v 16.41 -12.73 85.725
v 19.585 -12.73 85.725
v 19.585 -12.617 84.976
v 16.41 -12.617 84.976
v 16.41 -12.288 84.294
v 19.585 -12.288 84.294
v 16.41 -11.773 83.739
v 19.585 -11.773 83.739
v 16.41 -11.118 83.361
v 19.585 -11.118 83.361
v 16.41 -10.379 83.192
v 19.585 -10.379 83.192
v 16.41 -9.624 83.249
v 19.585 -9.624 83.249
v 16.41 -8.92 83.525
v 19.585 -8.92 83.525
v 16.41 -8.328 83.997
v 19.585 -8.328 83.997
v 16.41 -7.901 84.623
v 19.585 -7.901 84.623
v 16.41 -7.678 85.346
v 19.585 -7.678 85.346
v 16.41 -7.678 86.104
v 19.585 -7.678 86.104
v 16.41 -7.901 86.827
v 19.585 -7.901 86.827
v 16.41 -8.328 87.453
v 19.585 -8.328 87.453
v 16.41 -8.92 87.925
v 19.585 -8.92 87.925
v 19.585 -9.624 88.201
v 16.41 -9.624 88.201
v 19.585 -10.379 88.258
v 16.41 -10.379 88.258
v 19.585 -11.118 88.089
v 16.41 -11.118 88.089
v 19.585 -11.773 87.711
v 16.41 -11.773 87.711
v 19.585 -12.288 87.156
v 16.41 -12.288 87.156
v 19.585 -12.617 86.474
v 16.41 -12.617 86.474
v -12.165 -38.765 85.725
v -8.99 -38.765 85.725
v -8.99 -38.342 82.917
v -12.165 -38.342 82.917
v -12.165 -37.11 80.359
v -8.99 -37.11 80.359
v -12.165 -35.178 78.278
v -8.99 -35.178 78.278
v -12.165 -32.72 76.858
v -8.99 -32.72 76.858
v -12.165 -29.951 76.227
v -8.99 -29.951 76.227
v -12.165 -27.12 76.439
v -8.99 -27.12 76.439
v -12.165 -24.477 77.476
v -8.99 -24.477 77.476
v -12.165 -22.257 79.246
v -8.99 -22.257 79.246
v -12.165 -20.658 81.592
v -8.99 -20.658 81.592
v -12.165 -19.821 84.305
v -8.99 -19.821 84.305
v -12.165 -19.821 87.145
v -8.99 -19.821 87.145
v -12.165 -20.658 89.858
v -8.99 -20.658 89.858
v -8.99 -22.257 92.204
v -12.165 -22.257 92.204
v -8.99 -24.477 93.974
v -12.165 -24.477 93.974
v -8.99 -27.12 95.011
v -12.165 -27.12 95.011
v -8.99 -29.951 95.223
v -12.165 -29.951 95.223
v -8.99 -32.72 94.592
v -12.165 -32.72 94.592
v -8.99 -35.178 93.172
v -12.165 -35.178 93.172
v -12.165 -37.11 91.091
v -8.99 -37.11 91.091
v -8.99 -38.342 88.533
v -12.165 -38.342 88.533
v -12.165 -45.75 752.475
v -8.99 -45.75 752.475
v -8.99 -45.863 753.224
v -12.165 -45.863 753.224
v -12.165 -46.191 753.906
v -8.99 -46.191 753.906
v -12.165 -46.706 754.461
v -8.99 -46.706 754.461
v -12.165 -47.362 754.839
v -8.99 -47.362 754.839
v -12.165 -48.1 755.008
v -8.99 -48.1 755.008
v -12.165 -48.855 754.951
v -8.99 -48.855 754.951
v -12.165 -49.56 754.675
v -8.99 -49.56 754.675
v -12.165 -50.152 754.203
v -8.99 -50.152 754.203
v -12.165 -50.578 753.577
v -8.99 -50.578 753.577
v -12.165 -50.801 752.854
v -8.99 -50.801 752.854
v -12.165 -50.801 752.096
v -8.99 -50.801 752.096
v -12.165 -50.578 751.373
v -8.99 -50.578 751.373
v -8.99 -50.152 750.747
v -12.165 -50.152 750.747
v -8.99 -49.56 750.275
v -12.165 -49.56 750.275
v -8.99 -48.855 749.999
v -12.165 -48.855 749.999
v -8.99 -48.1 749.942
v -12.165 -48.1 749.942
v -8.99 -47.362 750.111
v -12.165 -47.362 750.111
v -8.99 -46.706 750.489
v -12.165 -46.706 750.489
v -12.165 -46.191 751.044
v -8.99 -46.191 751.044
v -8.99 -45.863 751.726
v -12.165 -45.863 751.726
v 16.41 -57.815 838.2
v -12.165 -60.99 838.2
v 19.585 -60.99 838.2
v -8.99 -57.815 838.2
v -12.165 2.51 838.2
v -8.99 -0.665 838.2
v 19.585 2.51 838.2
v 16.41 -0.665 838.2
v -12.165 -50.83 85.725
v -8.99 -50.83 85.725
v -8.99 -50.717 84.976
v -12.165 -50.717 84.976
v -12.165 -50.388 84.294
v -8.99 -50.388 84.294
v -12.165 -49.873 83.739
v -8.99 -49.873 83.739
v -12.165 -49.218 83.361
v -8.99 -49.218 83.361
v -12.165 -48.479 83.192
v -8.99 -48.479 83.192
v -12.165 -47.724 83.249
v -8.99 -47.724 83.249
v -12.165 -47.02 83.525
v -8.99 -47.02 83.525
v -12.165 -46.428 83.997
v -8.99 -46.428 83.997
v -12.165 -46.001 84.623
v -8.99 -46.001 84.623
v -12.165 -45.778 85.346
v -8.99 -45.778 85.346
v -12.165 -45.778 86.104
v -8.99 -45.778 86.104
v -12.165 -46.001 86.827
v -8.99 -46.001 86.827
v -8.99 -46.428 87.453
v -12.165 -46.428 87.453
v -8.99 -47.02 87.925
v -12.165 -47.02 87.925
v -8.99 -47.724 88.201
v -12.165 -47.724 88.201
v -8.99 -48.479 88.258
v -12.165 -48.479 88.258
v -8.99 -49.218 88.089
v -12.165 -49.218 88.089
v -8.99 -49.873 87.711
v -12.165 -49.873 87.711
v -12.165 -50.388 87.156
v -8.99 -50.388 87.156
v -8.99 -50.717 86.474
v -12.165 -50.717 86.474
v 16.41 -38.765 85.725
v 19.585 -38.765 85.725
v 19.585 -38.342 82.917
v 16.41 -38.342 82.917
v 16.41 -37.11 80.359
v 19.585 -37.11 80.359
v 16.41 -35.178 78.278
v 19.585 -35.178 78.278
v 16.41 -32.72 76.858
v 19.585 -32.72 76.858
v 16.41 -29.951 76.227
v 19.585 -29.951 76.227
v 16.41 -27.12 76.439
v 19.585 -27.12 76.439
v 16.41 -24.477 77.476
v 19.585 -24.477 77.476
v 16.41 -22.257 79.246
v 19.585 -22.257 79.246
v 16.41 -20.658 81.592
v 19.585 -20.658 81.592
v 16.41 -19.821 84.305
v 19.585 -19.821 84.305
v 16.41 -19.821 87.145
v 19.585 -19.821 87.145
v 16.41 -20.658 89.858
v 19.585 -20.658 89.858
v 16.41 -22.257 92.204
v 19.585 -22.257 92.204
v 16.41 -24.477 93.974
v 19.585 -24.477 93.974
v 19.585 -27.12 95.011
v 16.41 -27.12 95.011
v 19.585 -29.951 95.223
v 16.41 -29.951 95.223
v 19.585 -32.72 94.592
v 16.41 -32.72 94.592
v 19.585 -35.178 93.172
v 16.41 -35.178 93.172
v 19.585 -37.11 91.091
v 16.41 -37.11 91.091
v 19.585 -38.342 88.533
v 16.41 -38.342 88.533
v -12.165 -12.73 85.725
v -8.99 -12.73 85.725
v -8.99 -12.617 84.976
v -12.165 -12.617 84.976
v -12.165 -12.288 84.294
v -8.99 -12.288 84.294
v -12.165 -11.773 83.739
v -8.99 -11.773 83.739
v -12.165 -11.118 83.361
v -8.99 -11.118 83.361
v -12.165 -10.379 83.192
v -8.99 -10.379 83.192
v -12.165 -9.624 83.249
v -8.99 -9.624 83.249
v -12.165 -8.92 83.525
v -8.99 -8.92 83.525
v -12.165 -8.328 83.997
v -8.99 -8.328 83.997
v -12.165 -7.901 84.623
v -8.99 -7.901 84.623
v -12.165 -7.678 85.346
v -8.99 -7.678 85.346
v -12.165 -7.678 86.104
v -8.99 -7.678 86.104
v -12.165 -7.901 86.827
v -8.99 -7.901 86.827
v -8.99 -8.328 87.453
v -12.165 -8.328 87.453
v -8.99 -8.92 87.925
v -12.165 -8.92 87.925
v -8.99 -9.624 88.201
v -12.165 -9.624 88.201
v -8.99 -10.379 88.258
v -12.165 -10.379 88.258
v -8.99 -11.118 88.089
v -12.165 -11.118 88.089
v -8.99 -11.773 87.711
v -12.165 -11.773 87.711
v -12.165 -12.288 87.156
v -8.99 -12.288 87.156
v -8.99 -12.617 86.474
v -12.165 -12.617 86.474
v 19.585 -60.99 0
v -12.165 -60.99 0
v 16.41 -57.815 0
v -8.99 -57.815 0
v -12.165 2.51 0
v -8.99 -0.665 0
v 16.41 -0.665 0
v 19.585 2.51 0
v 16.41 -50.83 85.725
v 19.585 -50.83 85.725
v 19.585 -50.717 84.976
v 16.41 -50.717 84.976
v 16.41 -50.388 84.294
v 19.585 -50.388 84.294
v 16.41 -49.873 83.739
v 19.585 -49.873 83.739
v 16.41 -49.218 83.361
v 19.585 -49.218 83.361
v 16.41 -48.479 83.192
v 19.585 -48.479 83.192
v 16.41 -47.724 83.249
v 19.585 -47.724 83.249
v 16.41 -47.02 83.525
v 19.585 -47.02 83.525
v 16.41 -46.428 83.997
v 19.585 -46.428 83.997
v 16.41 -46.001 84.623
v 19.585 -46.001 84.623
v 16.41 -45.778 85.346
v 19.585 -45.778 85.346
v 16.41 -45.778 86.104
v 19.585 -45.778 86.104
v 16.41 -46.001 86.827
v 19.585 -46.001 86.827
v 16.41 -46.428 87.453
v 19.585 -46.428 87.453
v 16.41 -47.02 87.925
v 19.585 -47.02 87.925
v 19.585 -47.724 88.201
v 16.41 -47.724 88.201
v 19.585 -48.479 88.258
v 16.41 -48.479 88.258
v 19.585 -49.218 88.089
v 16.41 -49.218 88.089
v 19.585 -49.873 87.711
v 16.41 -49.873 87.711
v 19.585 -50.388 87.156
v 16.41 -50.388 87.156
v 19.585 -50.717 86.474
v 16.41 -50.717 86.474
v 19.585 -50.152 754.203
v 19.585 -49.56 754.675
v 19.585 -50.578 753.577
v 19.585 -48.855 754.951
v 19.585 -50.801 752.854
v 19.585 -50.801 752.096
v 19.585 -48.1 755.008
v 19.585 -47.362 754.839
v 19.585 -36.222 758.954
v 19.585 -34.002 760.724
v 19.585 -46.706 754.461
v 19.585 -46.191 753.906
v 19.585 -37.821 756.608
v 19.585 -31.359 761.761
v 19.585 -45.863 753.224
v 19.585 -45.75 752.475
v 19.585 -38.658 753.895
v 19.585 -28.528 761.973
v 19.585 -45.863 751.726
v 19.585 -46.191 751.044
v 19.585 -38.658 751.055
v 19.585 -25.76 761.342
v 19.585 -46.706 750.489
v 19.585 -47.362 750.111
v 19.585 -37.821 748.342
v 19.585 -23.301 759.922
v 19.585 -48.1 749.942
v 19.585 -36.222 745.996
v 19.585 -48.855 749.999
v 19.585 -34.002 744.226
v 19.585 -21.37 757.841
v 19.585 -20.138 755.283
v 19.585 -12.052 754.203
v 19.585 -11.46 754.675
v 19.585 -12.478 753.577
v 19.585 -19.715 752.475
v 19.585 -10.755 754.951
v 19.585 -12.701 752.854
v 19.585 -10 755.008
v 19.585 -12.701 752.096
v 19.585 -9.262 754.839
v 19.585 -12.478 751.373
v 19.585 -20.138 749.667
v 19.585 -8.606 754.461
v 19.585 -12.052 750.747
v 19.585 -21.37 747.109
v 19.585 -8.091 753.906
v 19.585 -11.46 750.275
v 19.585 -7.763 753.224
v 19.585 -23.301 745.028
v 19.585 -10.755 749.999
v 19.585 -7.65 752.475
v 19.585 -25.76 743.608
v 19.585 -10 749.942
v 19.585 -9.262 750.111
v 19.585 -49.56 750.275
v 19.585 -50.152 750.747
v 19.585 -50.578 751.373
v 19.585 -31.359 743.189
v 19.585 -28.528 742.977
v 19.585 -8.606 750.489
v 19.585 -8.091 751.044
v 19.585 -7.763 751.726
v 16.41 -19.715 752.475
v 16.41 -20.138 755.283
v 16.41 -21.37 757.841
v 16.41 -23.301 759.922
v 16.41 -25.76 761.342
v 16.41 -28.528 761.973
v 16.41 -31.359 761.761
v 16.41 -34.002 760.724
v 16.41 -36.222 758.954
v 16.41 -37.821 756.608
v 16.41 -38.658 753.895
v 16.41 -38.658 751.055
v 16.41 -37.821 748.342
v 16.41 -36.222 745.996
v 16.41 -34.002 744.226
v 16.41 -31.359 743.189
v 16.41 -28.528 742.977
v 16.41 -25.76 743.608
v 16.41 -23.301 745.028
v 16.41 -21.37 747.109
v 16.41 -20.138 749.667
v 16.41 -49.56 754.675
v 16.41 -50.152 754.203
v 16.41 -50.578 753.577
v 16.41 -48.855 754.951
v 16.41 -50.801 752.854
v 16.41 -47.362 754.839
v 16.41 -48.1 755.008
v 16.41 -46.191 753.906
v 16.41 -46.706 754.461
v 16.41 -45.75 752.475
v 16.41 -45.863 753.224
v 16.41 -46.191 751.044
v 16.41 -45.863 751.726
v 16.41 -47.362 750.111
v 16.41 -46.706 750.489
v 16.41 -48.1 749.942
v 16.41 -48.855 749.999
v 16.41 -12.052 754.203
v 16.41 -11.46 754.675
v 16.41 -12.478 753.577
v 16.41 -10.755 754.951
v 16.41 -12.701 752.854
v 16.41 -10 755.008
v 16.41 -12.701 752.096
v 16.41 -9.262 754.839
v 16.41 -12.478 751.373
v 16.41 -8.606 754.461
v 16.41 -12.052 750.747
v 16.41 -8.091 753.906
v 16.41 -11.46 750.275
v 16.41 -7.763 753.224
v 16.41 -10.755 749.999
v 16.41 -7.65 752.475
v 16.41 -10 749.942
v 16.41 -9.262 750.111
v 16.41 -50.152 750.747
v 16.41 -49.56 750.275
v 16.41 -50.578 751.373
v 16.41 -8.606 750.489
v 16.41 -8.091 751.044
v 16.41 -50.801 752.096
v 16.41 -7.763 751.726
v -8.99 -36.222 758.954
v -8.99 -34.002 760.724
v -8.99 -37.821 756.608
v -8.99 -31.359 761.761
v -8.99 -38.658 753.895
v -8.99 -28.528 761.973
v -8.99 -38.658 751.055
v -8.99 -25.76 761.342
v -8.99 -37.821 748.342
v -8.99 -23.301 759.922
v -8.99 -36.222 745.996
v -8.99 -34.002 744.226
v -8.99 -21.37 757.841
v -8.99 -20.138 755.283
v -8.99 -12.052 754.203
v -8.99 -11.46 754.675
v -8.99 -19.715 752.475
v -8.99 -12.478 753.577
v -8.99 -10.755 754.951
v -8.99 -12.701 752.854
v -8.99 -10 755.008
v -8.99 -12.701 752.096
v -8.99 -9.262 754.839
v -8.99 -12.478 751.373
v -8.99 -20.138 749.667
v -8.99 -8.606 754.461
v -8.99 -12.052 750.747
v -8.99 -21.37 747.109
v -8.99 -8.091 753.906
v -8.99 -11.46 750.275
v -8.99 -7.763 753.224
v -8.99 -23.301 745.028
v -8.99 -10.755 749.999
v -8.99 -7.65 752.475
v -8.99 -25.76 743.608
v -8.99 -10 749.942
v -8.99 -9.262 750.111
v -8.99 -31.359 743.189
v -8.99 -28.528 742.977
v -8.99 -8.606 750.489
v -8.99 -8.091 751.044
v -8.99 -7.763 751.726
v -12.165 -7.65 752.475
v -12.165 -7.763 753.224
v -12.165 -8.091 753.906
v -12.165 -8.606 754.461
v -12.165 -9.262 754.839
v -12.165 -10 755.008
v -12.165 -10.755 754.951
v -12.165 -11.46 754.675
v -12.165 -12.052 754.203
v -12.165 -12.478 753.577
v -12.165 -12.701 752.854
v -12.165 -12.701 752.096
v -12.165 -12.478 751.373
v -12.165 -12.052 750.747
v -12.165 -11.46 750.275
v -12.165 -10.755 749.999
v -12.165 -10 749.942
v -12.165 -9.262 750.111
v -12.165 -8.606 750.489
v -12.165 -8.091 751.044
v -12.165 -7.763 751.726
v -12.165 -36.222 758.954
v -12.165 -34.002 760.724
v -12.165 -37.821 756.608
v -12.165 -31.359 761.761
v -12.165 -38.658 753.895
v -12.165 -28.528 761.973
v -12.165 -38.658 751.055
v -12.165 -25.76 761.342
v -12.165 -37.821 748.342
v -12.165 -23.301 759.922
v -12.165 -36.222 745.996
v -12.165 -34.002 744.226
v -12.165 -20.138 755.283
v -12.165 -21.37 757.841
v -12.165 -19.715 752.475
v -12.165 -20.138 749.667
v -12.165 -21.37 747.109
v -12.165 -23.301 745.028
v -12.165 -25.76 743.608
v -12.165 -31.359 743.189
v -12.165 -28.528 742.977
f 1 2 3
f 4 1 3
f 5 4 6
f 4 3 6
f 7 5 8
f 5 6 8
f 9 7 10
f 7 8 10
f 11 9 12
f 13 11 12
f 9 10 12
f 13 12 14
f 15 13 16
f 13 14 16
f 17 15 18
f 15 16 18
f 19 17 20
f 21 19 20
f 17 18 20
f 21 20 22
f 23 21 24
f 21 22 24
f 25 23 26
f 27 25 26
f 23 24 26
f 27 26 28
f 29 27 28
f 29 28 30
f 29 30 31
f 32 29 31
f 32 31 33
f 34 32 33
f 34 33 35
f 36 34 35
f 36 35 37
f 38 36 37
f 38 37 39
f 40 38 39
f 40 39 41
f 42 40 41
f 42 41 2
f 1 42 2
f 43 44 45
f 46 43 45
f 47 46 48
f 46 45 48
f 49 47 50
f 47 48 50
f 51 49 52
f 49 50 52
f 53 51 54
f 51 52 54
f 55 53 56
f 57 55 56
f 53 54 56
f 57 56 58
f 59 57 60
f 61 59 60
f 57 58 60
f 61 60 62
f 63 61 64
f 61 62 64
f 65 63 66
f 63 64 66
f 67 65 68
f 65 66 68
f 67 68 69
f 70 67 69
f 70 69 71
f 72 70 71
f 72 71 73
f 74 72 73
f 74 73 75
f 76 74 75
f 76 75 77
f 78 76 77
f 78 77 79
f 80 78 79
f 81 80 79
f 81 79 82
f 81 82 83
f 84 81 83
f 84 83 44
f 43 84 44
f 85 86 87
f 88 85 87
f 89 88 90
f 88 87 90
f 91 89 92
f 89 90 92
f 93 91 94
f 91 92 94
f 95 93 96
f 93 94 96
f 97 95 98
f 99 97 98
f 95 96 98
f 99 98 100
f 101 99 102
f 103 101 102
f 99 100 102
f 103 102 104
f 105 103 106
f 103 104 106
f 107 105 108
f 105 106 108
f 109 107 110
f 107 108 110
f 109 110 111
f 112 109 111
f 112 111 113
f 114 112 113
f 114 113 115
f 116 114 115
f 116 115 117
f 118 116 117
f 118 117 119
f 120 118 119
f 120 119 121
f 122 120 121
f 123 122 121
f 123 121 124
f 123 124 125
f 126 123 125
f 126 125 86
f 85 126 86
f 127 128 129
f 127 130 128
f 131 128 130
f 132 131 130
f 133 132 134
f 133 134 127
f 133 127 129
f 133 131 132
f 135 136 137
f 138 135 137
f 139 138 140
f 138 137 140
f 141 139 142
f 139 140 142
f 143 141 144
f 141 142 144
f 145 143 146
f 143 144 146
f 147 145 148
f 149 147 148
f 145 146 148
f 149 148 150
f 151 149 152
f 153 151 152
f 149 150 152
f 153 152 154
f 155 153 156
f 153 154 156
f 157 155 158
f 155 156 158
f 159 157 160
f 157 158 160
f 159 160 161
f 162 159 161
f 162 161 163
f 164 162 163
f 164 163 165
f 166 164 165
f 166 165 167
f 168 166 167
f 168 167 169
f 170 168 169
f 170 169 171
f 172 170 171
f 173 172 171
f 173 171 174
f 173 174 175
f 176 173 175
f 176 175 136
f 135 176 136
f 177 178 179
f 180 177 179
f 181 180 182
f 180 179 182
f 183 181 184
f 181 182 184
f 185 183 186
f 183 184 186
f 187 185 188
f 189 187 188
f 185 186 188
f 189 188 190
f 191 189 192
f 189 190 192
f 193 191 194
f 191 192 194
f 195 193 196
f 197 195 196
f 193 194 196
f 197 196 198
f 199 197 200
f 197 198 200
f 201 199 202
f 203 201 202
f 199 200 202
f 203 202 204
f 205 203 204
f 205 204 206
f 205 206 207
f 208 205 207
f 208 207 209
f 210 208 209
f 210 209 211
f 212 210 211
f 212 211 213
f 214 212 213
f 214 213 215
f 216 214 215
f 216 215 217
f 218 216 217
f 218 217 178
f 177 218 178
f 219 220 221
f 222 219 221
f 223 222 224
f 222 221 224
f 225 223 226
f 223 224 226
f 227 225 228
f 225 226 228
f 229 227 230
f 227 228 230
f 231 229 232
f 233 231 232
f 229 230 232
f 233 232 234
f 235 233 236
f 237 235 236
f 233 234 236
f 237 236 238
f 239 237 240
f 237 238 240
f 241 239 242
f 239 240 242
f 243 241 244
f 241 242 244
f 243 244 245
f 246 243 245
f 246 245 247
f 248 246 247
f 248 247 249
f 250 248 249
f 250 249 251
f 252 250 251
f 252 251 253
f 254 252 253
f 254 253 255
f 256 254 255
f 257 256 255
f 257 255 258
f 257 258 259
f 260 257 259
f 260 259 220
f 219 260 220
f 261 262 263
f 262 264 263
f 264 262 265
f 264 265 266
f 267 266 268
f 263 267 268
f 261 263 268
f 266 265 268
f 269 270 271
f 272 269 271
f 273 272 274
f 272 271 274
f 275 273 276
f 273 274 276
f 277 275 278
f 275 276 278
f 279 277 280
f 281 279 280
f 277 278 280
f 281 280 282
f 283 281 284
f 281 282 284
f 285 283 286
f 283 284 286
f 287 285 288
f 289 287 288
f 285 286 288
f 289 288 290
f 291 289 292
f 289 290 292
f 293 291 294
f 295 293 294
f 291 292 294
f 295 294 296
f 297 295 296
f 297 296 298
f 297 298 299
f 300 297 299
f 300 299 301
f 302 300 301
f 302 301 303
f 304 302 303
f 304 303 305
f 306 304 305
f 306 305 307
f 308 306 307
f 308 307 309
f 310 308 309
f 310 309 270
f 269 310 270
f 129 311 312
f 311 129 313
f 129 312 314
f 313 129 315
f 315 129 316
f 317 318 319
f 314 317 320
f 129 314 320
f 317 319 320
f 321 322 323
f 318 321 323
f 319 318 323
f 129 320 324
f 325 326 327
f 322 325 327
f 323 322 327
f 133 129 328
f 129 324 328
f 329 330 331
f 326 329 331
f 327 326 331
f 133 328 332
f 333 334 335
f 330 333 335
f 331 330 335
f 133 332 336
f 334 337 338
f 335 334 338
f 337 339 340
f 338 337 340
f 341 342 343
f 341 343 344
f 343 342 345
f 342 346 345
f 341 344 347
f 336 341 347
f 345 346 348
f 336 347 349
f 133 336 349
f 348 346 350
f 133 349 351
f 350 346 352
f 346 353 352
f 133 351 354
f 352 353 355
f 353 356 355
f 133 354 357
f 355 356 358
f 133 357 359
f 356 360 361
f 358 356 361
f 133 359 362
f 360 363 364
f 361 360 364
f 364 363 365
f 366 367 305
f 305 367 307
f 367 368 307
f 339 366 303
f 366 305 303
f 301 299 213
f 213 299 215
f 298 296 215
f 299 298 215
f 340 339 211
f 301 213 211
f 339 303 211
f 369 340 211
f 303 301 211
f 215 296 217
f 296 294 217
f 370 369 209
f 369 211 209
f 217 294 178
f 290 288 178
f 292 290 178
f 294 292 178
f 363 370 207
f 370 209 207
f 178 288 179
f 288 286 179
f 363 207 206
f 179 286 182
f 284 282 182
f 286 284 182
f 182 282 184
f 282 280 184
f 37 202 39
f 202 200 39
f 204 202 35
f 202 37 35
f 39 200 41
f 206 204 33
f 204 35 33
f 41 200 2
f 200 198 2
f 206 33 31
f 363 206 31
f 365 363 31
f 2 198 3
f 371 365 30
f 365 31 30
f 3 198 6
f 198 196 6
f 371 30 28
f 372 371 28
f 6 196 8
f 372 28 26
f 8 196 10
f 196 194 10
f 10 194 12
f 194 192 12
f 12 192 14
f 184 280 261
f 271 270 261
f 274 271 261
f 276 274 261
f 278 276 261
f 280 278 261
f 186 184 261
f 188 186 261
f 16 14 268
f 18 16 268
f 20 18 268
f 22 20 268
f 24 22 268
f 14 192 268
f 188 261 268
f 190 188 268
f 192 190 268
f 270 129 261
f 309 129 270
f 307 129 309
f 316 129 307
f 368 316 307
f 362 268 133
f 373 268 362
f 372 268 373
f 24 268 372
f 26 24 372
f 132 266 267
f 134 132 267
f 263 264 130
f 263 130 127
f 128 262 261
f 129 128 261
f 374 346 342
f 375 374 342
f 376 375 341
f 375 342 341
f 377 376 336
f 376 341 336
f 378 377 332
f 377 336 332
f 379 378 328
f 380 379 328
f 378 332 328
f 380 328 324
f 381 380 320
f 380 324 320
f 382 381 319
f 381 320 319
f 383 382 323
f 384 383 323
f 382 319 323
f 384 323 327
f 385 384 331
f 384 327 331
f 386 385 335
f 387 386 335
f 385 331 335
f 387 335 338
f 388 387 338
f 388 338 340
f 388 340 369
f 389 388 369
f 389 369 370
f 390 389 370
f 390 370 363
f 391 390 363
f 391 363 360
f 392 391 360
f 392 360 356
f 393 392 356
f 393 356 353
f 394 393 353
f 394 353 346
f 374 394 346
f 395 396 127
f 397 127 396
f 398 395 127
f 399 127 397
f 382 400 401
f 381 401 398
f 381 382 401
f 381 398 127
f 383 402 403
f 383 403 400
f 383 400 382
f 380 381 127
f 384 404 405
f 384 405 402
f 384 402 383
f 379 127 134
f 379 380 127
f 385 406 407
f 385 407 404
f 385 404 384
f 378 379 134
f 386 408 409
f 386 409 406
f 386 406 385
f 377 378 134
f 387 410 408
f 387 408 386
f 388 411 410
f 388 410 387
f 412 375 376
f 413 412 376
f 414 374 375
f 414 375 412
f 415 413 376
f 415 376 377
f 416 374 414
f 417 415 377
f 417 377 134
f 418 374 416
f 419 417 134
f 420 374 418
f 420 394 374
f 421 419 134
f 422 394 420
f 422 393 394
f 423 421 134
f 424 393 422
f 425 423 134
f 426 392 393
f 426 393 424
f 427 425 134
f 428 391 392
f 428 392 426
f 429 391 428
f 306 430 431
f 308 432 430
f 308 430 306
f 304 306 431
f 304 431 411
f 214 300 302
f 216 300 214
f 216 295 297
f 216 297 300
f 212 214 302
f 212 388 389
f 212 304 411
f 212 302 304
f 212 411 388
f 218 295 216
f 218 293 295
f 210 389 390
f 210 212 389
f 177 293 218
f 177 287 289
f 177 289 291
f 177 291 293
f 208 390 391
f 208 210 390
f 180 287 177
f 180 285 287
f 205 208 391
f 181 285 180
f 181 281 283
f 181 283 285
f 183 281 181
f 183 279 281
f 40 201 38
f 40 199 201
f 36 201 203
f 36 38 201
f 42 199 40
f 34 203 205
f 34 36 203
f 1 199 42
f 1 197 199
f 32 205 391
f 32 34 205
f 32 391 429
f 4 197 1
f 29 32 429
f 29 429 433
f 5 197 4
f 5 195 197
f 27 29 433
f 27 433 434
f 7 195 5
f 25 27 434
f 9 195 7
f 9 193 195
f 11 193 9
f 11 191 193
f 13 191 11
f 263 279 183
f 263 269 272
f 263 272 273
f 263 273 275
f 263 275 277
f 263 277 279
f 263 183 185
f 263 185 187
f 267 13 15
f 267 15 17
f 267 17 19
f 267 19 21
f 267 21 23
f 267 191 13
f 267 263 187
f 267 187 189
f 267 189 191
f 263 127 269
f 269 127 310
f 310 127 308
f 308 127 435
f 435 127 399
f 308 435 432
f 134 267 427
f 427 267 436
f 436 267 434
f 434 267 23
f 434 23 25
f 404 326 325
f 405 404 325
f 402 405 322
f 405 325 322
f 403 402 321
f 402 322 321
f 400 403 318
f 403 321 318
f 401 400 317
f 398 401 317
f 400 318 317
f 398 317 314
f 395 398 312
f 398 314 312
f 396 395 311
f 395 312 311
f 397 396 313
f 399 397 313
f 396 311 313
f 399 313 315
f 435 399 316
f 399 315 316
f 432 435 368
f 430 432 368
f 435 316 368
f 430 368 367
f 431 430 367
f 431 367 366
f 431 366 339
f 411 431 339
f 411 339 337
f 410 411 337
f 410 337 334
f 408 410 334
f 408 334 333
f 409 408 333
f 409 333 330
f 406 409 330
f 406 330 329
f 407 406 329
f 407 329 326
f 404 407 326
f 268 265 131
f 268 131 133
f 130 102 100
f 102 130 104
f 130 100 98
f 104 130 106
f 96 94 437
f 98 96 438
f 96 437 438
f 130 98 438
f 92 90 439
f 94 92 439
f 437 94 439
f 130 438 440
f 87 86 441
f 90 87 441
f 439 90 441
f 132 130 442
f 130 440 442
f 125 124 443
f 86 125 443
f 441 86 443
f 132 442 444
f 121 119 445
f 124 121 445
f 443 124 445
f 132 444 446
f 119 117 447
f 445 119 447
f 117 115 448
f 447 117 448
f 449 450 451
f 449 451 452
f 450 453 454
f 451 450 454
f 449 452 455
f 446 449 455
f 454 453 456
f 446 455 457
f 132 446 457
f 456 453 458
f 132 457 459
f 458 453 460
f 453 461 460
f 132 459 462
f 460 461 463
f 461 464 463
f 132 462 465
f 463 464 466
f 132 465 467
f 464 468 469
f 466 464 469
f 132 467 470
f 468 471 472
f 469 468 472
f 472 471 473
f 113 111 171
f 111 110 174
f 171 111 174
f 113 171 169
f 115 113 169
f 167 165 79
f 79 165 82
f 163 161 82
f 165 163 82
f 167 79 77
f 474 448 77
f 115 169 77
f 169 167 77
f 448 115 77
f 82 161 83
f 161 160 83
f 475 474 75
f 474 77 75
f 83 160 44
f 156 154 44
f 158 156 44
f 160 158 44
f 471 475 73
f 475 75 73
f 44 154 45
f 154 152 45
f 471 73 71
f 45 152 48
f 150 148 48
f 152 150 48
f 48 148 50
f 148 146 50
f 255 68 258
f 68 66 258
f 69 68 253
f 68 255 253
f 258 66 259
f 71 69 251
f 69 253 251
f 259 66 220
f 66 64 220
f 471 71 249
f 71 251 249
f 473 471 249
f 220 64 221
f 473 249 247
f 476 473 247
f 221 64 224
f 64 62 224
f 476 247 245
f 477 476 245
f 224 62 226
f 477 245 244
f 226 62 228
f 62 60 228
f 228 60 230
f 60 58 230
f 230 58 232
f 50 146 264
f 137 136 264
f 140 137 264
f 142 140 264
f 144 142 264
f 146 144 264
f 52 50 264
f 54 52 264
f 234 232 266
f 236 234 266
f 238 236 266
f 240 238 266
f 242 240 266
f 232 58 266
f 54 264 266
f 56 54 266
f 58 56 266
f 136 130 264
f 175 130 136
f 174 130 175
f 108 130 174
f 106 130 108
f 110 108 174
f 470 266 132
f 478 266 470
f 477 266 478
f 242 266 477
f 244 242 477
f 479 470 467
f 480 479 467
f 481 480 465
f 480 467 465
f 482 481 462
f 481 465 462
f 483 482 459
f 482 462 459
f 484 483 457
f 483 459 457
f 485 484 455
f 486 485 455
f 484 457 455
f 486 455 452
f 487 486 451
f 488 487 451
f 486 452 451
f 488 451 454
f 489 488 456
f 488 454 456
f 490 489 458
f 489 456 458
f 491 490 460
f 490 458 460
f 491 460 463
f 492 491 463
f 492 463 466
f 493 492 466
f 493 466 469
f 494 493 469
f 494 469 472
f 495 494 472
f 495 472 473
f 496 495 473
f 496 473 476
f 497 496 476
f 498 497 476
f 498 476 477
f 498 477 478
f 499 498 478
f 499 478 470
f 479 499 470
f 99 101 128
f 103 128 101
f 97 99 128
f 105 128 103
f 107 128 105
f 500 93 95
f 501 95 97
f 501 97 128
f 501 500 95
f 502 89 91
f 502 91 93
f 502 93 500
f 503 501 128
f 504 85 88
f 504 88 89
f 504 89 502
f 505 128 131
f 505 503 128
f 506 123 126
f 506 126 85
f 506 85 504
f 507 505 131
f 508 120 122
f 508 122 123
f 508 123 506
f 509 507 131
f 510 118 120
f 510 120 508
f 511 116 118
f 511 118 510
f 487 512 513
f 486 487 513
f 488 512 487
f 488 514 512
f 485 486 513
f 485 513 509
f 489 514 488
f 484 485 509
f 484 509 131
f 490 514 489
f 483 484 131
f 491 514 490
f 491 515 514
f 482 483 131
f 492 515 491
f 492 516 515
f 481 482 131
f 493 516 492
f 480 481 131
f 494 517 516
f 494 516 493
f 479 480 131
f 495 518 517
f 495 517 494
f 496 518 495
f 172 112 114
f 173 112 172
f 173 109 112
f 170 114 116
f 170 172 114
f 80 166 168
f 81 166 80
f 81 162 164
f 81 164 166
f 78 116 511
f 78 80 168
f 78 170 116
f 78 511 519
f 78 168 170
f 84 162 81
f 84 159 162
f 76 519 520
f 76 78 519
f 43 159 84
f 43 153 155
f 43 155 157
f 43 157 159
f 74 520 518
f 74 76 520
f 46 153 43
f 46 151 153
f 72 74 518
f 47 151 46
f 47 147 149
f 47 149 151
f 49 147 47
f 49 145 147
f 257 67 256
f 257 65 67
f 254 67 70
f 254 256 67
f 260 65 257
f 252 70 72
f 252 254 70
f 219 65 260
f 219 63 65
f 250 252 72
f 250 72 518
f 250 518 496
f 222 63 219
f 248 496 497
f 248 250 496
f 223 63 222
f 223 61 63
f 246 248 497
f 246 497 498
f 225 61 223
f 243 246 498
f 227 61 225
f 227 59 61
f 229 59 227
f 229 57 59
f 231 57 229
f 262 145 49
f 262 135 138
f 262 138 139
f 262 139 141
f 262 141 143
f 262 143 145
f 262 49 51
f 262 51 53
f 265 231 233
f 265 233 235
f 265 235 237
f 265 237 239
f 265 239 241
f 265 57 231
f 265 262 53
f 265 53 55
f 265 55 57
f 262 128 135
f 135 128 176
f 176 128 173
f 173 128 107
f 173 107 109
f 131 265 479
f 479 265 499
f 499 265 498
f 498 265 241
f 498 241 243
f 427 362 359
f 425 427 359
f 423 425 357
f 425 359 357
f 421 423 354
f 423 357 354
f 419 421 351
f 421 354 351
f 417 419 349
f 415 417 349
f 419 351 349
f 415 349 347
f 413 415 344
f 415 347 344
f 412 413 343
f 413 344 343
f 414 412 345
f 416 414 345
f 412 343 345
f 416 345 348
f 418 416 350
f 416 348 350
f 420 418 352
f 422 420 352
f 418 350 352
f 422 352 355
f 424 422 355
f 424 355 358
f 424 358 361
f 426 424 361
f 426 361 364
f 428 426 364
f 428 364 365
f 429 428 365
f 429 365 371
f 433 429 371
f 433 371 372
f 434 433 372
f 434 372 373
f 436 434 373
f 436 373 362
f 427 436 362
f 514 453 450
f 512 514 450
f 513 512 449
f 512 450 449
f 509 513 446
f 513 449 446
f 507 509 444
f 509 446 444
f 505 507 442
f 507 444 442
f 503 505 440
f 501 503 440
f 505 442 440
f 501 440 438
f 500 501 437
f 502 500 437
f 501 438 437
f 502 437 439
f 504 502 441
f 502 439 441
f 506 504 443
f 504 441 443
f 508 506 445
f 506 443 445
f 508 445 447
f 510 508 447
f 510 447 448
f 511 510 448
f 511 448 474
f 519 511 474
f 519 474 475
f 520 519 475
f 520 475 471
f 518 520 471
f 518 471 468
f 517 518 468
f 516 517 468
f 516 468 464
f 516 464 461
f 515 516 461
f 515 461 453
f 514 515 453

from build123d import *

# Parameters (mm, degrees)
SKETCH1_W           = 31.75
SKETCH1_H           = 63.5
SKETCH1_W_2         = 25.4
SKETCH1_H_2         = 57.15
BOSS_EXTRUDE1_DEPTH = 838.2
CUT_EXTRUDE1_REACH  = 843.015
SKETCH2_R           = 9.525
SKETCH2_R_2         = 2.54


with BuildPart() as part:
    # Sketch1 → Boss-Extrude1 (new body)
    with BuildSketch(Plane.XY):
        with Locations((3.710272719, -29.23968021)):
            Rectangle(SKETCH1_W, SKETCH1_H)
        with Locations((3.710272719, -29.23968021)):
            Rectangle(SKETCH1_W_2, SKETCH1_H_2, mode=Mode.SUBTRACT)
    extrude(amount=BOSS_EXTRUDE1_DEPTH)

    # Cut-Extrude1: up to this face of the body (flat: up to its plane)
    cut_extrude1_end = Plane(part.part.faces().sort_by_distance((-12.164727281, -29.23968021, 419.1))[0])
    # Sketch2 → Cut-Extrude1 (cut, up to the picked face)
    with BuildSketch(Plane(origin=(19.585272719, 0, 0), x_dir=(0, 0, -1), z_dir=(1, 0, 0)), mode=Mode.PRIVATE) as cut_extrude1_sk1:
        with Locations(Location((-752.475, -29.23968021, 0), (0, 0, 90))):
            Circle(SKETCH2_R)
    cut_extrude1_tool1 = split(extrude(cut_extrude1_sk1.sketch, amount=-CUT_EXTRUDE1_REACH, mode=Mode.PRIVATE), bisect_by=cut_extrude1_end, keep=Keep.BOTH, mode=Mode.PRIVATE)
    # Sketch2 → Cut-Extrude1 (cut, up to the picked face)
    with BuildSketch(Plane(origin=(19.585272719, 0, 0), x_dir=(0, 0, -1), z_dir=(1, 0, 0)), mode=Mode.PRIVATE) as cut_extrude1_sk2:
        with Locations(Location((-752.475, -48.28968021, 0), (0, 0, 90))):
            Circle(SKETCH2_R_2)
    cut_extrude1_tool2 = split(extrude(cut_extrude1_sk2.sketch, amount=-CUT_EXTRUDE1_REACH, mode=Mode.PRIVATE), bisect_by=cut_extrude1_end, keep=Keep.BOTH, mode=Mode.PRIVATE)
    # Sketch2 → Cut-Extrude1 (cut, up to the picked face)
    with BuildSketch(Plane(origin=(19.585272719, 0, 0), x_dir=(0, 0, -1), z_dir=(1, 0, 0)), mode=Mode.PRIVATE) as cut_extrude1_sk3:
        with Locations(Location((-752.475, -10.18968021, 0), (0, 0, 90))):
            Circle(SKETCH2_R_2)
    cut_extrude1_tool3 = split(extrude(cut_extrude1_sk3.sketch, amount=-CUT_EXTRUDE1_REACH, mode=Mode.PRIVATE), bisect_by=cut_extrude1_end, keep=Keep.BOTH, mode=Mode.PRIVATE)
    # Sketch2 → Cut-Extrude1 (cut, up to the picked face)
    with BuildSketch(Plane(origin=(19.585272719, 0, 0), x_dir=(0, 0, -1), z_dir=(1, 0, 0)), mode=Mode.PRIVATE) as cut_extrude1_sk4:
        with Locations(Location((-85.725, -48.28968021, 0), (0, 0, 270))):
            Circle(SKETCH2_R_2)
    cut_extrude1_tool4 = split(extrude(cut_extrude1_sk4.sketch, amount=-CUT_EXTRUDE1_REACH, mode=Mode.PRIVATE), bisect_by=cut_extrude1_end, keep=Keep.BOTH, mode=Mode.PRIVATE)
    # Sketch2 → Cut-Extrude1 (cut, up to the picked face)
    with BuildSketch(Plane(origin=(19.585272719, 0, 0), x_dir=(0, 0, -1), z_dir=(1, 0, 0)), mode=Mode.PRIVATE) as cut_extrude1_sk5:
        with Locations(Location((-85.725, -29.23968021, 0), (0, 0, 270))):
            Circle(SKETCH2_R)
    cut_extrude1_tool5 = split(extrude(cut_extrude1_sk5.sketch, amount=-CUT_EXTRUDE1_REACH, mode=Mode.PRIVATE), bisect_by=cut_extrude1_end, keep=Keep.BOTH, mode=Mode.PRIVATE)
    # Sketch2 → Cut-Extrude1 (cut, up to the picked face)
    with BuildSketch(Plane(origin=(19.585272719, 0, 0), x_dir=(0, 0, -1), z_dir=(1, 0, 0)), mode=Mode.PRIVATE) as cut_extrude1_sk6:
        with Locations(Location((-85.725, -10.18968021, 0), (0, 0, 270))):
            Circle(SKETCH2_R_2)
    cut_extrude1_tool6 = split(extrude(cut_extrude1_sk6.sketch, amount=-CUT_EXTRUDE1_REACH, mode=Mode.PRIVATE), bisect_by=cut_extrude1_end, keep=Keep.BOTH, mode=Mode.PRIVATE)
    add(cut_extrude1_tool1.solids().sort_by(Axis((19.585273, -29.23968, 752.475), (-1, 0, 0)))[0], mode=Mode.SUBTRACT)
    add(cut_extrude1_tool2.solids().sort_by(Axis((19.585273, -48.28968, 752.475), (-1, 0, 0)))[0], mode=Mode.SUBTRACT)
    add(cut_extrude1_tool3.solids().sort_by(Axis((19.585273, -10.18968, 752.475), (-1, 0, 0)))[0], mode=Mode.SUBTRACT)
    add(cut_extrude1_tool4.solids().sort_by(Axis((19.585273, -48.28968, 85.725), (-1, 0, 0)))[0], mode=Mode.SUBTRACT)
    add(cut_extrude1_tool5.solids().sort_by(Axis((19.585273, -29.23968, 85.725), (-1, 0, 0)))[0], mode=Mode.SUBTRACT)
    add(cut_extrude1_tool6.solids().sort_by(Axis((19.585273, -10.18968, 85.725), (-1, 0, 0)))[0], mode=Mode.SUBTRACT)


solid = part.part
